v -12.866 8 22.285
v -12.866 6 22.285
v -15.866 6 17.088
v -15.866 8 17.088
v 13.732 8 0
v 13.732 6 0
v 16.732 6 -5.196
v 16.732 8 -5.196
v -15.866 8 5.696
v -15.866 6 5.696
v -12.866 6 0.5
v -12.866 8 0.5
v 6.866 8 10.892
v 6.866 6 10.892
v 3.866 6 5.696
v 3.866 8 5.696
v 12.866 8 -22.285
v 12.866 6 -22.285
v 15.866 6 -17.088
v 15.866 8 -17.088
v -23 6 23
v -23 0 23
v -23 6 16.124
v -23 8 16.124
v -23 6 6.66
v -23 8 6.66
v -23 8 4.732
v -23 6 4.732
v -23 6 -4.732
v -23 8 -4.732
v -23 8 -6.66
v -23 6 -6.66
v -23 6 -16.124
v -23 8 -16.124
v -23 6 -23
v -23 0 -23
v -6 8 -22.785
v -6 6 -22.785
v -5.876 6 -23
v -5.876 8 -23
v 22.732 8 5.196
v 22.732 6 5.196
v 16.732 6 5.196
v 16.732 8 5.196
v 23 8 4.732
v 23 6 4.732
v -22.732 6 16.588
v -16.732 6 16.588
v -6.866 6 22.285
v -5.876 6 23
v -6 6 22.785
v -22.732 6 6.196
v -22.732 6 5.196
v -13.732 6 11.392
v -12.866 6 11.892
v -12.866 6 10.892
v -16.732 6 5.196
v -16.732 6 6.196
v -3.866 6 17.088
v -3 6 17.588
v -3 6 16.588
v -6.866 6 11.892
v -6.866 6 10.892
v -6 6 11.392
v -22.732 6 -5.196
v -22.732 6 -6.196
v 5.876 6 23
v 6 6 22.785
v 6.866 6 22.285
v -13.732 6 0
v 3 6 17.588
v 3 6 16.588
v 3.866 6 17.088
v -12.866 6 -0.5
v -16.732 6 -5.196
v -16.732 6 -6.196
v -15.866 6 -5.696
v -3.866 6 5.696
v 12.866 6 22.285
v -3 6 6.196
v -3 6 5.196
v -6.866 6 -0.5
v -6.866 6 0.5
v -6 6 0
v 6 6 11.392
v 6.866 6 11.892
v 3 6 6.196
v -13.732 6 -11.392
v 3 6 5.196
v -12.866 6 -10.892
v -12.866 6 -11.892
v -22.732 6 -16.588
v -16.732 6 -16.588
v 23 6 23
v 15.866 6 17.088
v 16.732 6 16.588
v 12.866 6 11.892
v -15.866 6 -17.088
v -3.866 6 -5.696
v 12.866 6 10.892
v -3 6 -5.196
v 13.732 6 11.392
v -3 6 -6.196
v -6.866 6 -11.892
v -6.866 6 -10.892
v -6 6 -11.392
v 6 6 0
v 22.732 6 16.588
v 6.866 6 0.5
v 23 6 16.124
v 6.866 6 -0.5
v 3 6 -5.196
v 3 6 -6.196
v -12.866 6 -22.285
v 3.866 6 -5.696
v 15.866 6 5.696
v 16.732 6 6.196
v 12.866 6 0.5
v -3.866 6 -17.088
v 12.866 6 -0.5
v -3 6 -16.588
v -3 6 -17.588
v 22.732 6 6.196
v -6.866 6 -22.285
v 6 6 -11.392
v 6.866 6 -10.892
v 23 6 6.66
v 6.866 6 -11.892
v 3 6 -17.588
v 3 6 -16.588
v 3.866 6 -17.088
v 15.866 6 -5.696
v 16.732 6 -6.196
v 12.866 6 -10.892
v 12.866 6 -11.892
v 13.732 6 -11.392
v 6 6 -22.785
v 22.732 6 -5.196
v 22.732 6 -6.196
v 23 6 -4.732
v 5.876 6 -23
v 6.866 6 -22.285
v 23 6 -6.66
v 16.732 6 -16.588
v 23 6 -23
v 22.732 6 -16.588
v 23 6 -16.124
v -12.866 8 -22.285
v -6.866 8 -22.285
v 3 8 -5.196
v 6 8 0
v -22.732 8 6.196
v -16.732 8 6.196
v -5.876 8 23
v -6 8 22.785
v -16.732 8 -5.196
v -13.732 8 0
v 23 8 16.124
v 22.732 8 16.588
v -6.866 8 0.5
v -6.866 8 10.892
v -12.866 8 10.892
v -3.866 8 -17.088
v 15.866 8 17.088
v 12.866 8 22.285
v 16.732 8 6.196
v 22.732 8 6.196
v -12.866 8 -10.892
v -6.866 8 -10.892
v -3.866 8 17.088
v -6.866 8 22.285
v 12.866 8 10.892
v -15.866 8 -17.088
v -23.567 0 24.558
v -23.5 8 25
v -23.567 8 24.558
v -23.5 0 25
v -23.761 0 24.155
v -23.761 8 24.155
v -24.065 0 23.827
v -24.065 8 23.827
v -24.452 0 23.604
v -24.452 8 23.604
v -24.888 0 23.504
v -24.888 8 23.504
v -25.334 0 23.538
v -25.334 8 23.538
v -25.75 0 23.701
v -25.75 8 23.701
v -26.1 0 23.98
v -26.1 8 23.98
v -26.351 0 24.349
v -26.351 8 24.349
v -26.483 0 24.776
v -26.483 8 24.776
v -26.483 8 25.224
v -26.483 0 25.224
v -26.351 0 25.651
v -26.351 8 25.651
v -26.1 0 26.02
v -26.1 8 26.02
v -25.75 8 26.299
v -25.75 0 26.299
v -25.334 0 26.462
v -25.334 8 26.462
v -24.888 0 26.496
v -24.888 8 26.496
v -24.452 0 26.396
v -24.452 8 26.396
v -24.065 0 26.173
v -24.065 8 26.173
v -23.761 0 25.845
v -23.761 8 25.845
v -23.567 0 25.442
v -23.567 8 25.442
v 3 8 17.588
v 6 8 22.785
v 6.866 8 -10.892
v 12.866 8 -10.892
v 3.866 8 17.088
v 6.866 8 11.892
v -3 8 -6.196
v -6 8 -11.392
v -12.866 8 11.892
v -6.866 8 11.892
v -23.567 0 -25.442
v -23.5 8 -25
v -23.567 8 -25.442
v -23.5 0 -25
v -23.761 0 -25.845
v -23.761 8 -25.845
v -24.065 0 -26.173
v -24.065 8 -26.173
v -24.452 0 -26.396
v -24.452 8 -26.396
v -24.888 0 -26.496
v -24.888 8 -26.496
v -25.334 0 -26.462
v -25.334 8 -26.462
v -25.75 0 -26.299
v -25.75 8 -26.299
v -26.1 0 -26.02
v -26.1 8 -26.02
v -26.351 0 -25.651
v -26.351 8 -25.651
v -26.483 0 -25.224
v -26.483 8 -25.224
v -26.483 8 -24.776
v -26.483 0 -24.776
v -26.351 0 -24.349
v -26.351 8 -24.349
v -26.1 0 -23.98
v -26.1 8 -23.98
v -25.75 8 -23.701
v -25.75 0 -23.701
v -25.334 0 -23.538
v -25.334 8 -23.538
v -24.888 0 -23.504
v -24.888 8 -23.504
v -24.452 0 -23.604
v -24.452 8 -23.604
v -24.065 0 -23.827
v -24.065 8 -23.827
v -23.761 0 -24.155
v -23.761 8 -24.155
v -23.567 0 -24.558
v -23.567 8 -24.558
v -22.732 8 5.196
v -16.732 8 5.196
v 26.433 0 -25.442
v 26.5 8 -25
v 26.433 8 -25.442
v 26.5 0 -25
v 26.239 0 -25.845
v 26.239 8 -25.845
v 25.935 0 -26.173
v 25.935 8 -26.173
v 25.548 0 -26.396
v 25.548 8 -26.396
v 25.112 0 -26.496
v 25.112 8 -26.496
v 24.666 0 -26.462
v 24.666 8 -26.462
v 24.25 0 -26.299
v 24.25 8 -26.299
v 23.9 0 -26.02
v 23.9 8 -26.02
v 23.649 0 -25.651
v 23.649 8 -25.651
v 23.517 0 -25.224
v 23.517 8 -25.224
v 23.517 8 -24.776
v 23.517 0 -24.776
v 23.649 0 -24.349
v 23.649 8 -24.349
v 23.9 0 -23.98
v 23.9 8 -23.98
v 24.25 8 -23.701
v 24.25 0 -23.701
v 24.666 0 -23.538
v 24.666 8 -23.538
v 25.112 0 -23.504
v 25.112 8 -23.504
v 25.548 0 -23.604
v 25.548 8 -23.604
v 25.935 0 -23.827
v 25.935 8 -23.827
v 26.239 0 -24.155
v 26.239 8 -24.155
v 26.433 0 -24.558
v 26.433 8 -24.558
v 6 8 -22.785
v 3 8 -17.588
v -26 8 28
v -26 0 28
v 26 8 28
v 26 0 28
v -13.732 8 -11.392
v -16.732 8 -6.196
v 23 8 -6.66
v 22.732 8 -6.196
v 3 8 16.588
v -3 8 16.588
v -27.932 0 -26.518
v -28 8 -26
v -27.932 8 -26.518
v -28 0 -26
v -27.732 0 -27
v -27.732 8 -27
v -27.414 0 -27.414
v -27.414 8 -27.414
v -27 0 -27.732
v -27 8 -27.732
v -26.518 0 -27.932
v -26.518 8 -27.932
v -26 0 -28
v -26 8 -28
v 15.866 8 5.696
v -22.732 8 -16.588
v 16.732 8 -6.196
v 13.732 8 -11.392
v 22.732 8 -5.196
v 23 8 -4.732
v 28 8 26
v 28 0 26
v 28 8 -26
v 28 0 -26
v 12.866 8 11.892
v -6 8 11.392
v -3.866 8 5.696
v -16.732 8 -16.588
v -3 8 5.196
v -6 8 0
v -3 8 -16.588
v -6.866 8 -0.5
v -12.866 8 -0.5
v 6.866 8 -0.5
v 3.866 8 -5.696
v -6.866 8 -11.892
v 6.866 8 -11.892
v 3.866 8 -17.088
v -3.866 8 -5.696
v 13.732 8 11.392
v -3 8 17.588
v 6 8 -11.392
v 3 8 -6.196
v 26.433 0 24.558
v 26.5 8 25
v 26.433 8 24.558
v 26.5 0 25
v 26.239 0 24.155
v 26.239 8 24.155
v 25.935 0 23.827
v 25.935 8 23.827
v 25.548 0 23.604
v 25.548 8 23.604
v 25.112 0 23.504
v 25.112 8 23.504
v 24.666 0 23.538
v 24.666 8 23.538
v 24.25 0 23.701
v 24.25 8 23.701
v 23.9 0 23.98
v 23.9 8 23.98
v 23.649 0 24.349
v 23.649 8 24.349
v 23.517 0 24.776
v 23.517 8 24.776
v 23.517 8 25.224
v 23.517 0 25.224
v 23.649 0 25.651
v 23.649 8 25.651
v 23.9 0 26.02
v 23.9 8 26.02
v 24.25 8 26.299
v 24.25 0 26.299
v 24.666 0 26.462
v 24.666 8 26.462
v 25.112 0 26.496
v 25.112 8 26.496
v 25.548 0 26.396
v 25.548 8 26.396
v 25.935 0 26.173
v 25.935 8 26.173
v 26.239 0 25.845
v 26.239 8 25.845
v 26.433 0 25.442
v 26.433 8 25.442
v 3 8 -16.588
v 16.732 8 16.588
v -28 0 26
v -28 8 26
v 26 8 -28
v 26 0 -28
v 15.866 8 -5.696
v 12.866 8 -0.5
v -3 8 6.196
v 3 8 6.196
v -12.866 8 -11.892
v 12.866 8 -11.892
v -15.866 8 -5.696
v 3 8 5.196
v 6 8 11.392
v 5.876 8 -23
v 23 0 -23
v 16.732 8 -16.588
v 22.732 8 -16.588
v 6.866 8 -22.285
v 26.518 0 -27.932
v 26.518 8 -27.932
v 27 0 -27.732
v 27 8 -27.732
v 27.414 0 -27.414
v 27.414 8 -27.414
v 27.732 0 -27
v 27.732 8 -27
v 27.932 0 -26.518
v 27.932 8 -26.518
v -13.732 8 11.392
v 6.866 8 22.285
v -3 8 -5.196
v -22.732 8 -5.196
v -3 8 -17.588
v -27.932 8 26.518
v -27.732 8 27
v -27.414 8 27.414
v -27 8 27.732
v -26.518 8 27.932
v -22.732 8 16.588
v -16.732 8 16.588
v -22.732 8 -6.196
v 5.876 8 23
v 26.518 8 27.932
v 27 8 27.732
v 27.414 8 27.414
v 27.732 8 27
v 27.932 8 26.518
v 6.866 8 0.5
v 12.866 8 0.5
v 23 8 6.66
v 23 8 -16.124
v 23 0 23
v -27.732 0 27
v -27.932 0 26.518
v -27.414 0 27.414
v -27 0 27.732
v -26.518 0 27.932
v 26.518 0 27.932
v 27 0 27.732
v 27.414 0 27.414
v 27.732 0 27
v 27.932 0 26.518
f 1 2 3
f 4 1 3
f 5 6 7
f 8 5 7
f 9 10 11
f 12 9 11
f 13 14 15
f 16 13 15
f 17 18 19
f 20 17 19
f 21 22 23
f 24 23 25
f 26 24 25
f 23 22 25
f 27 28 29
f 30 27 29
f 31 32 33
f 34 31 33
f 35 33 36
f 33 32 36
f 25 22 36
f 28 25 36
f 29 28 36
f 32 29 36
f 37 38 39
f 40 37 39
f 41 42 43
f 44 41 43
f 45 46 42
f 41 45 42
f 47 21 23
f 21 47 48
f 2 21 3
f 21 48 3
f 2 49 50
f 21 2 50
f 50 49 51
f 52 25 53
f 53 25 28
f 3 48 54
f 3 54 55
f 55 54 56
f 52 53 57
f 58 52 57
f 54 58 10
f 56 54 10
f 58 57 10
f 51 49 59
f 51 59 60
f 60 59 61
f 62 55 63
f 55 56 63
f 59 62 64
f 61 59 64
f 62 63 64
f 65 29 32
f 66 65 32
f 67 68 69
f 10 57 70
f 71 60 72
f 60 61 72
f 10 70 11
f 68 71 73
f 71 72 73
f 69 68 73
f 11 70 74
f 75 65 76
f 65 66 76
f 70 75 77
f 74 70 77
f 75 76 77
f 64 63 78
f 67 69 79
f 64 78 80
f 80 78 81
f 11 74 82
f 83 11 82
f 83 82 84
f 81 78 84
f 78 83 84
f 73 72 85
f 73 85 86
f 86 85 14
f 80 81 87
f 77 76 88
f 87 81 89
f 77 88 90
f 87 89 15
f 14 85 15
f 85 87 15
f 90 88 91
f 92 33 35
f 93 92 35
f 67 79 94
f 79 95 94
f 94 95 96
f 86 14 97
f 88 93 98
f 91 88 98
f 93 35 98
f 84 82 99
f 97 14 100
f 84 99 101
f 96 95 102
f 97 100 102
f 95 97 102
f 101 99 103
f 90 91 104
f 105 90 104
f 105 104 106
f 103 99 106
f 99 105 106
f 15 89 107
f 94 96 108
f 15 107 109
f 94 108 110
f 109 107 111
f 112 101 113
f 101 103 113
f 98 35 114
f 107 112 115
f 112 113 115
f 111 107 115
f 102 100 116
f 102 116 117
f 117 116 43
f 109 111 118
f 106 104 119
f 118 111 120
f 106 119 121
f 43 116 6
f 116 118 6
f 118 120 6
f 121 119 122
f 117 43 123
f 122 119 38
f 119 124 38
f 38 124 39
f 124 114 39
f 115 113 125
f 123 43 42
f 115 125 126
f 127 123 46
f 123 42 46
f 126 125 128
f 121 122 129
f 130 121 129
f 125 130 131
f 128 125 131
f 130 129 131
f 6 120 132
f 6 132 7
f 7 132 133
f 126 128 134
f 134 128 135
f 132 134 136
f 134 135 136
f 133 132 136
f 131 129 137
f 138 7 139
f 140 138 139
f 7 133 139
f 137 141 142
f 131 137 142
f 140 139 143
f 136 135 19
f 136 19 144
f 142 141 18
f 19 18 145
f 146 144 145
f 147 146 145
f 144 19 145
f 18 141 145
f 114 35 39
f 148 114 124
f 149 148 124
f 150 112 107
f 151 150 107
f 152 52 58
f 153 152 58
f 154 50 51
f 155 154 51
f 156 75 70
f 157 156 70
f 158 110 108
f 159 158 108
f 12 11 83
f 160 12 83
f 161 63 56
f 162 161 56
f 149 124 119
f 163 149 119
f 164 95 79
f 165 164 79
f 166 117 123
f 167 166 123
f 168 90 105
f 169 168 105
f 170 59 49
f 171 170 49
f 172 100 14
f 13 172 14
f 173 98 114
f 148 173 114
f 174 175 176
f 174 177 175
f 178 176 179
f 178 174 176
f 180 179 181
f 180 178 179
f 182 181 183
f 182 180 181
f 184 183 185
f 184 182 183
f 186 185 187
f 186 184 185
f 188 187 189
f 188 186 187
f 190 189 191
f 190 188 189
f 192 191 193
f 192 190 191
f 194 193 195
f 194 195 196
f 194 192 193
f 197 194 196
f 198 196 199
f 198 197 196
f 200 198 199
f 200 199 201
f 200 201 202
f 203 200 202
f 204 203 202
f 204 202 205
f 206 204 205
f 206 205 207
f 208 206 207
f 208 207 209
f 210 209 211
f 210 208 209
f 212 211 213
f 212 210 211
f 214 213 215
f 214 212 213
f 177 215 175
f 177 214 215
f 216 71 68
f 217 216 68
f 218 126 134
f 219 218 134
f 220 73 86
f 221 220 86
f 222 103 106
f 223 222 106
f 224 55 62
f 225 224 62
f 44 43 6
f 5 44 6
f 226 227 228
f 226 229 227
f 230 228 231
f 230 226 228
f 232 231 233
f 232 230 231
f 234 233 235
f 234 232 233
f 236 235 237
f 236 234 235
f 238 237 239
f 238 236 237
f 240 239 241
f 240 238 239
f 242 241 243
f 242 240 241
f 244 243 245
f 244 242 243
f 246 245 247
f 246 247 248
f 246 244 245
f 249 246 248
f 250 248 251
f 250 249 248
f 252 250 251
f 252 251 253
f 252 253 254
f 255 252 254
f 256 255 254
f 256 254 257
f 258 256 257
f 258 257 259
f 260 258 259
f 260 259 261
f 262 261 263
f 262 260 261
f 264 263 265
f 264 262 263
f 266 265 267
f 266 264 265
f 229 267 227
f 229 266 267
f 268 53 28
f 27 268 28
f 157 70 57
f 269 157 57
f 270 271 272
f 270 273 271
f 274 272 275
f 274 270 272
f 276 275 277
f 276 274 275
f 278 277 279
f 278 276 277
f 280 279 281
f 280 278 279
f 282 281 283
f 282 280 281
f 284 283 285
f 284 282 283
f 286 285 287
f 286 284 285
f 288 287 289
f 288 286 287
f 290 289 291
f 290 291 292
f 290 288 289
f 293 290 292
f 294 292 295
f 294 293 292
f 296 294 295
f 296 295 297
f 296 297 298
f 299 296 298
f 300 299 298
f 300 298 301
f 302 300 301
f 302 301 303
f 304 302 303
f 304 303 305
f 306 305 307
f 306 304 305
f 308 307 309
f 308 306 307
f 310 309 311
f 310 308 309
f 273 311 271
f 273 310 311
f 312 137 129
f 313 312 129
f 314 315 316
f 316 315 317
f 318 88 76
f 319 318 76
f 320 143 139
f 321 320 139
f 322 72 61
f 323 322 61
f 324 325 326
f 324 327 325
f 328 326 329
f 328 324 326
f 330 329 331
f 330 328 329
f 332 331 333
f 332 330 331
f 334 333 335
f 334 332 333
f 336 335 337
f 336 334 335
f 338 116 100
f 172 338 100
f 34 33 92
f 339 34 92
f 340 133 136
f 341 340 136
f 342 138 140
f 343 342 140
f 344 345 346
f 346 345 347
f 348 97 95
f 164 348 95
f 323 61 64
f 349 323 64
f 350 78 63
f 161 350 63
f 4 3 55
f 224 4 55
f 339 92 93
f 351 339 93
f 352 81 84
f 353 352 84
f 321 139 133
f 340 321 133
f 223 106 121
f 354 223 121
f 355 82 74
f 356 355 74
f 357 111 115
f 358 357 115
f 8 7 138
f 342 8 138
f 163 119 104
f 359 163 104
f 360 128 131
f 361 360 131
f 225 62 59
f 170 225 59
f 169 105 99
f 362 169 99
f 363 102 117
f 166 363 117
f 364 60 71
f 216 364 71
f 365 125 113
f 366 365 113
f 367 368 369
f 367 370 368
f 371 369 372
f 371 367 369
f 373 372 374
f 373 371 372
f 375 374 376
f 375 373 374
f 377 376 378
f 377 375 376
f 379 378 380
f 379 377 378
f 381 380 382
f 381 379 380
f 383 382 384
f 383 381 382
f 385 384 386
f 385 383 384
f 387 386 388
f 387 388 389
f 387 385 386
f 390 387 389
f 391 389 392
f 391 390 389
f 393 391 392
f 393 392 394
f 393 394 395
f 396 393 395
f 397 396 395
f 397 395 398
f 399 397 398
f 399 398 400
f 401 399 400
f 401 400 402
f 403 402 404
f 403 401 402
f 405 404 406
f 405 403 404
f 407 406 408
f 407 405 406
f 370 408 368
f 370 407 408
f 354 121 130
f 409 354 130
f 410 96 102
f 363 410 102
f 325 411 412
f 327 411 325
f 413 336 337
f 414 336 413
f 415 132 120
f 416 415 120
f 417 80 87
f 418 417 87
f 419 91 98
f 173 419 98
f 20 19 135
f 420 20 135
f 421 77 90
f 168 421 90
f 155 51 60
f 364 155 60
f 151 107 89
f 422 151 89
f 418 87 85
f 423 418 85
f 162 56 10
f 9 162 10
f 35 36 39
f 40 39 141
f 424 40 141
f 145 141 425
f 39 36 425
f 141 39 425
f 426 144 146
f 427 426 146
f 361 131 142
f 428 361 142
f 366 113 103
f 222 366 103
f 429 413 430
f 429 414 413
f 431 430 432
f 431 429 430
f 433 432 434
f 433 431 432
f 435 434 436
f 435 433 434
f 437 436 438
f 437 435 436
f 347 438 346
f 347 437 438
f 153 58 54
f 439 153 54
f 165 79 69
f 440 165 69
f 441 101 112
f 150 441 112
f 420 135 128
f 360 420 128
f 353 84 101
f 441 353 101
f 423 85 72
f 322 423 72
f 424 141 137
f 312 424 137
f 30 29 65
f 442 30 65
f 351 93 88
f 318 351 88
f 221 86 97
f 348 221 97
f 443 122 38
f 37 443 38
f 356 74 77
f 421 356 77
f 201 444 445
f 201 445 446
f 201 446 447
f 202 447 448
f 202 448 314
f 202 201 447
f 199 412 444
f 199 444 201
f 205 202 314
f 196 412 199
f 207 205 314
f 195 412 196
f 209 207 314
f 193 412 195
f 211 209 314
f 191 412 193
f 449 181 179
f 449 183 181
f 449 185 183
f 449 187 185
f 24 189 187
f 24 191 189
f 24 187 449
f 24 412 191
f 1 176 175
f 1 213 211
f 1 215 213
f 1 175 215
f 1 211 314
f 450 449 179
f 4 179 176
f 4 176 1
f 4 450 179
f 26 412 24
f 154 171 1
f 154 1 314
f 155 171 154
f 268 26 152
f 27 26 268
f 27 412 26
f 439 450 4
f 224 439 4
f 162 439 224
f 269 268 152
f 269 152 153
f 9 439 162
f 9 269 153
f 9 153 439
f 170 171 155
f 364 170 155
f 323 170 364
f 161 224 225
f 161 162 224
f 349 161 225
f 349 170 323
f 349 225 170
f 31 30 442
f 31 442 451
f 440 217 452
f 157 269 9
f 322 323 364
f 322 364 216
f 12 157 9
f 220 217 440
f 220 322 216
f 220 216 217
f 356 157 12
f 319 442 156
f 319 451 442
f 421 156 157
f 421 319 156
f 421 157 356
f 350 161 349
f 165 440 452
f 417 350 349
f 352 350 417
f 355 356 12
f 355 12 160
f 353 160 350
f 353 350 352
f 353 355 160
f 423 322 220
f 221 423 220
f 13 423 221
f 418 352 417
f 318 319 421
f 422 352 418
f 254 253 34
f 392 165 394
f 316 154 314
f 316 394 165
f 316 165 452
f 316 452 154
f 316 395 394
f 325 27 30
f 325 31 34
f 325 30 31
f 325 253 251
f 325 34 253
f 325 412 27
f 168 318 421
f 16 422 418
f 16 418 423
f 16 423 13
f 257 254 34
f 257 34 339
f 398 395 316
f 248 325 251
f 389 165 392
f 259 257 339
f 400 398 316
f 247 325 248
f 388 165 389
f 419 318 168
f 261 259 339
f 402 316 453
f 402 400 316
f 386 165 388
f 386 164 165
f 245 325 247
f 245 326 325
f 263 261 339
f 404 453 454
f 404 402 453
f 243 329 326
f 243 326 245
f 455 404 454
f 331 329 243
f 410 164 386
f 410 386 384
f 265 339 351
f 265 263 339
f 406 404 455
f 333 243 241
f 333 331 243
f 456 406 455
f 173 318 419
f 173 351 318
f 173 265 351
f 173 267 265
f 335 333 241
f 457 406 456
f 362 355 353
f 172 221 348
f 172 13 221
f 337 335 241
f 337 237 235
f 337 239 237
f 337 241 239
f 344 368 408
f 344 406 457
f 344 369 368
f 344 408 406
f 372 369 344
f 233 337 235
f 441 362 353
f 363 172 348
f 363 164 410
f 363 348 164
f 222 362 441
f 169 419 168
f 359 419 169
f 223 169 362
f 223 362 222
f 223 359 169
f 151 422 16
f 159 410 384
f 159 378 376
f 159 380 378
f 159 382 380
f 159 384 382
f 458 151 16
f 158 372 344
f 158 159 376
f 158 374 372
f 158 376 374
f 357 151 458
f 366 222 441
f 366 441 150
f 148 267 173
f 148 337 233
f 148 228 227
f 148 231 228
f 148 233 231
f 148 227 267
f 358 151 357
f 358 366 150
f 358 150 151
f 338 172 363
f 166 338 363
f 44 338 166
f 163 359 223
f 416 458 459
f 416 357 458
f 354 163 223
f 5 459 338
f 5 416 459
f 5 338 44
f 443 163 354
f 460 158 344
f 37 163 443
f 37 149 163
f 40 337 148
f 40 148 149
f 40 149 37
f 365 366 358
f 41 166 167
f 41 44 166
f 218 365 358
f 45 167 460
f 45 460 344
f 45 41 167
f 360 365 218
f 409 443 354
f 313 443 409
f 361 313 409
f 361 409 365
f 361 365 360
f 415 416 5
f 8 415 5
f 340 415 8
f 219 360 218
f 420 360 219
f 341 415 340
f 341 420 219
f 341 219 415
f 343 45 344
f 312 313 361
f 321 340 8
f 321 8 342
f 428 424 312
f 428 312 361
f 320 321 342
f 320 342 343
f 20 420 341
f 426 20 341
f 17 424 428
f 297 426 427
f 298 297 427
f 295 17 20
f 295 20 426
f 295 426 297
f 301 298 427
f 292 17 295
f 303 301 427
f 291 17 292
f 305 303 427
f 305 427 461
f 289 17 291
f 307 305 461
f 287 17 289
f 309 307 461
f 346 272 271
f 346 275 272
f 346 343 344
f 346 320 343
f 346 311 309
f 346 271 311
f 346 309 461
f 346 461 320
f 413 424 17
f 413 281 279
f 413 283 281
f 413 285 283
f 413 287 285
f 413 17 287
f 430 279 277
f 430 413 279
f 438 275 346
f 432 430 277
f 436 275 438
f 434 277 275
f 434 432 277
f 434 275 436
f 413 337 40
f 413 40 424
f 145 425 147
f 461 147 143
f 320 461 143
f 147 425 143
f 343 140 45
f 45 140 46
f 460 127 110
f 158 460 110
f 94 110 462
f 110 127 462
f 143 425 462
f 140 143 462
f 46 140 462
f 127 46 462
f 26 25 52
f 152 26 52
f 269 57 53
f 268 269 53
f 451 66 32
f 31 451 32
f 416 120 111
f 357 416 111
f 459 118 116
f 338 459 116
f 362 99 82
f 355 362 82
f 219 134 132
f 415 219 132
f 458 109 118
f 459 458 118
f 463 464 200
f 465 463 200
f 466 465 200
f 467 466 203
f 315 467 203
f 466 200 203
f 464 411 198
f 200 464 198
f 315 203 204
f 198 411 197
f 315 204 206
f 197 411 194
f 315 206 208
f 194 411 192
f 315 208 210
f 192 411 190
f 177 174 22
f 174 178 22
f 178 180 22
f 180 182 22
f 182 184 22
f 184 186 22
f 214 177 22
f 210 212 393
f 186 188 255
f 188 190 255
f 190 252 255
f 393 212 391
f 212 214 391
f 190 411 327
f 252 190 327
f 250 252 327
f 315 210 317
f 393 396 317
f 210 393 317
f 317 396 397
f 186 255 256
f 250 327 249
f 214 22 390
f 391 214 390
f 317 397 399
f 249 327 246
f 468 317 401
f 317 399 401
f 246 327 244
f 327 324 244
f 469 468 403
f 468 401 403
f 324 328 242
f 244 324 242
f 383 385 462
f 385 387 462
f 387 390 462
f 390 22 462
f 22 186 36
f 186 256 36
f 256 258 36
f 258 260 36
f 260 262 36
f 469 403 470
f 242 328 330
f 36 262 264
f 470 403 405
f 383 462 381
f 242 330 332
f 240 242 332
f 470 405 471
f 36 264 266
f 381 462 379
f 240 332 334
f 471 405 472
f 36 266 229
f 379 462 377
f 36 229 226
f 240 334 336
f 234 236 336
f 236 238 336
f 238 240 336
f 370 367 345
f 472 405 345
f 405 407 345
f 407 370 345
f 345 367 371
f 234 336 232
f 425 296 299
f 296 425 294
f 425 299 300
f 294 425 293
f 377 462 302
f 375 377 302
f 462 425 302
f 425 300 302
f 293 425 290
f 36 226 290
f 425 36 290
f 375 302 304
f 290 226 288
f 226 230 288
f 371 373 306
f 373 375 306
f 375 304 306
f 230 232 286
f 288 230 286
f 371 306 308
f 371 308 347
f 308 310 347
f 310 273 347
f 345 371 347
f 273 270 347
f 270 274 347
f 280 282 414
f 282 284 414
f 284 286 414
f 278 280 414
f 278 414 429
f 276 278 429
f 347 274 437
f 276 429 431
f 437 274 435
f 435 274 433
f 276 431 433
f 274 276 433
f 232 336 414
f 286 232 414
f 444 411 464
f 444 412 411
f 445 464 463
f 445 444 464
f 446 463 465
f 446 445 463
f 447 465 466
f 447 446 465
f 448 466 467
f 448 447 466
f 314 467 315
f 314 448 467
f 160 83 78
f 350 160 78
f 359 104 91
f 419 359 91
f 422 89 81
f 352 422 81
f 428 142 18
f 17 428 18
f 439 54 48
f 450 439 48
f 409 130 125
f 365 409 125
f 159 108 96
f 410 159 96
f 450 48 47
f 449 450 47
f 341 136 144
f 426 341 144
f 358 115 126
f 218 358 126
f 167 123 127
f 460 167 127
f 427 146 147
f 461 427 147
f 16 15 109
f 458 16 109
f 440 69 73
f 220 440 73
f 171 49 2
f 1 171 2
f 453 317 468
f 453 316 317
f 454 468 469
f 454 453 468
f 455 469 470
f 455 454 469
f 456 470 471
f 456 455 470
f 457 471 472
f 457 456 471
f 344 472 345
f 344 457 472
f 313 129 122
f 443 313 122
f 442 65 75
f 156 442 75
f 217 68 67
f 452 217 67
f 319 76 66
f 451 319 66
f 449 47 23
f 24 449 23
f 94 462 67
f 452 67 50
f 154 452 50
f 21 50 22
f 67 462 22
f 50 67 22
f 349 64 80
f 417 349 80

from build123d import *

# Parameters (mm, degrees)
SKETCH1_W               = 56
SKETCH1_H               = 56
SKETCH1_R               = 1.5
SKETCH1_W_2             = 46
SKETCH1_H_2             = 46
BOSS_EXTRUDE1_DEPTH     = 6
BOSS_EXTRUDE2_START     = 6
SKETCH1_2_W             = 56
SKETCH1_2_H             = 56
SKETCH1_2_R             = 1.5
BOSS_EXTRUDE2_DEPTH     = 2
CUT_EXTRUDE1_DEPTH      = 7
CUT_EXTRUDE1_DEPTH_BACK = 3
FILLET1_R               = 2


with BuildPart() as part:
    # Sketch1 → Boss-Extrude1 (new body)
    with BuildSketch(Plane(origin=(0, 0, 0), x_dir=(1, 0, 0), z_dir=(0, 1, 0))):
        Rectangle(SKETCH1_W, SKETCH1_H)
        with Locations((-25, 25)):
            Circle(SKETCH1_R, mode=Mode.SUBTRACT)
        with Locations((25, 25)):
            Circle(SKETCH1_R, mode=Mode.SUBTRACT)
        with Locations((25, -25)):
            Circle(SKETCH1_R, mode=Mode.SUBTRACT)
        with Locations((-25, -25)):
            Circle(SKETCH1_R, mode=Mode.SUBTRACT)
        Rectangle(SKETCH1_W_2, SKETCH1_H_2, mode=Mode.SUBTRACT)
    extrude(amount=BOSS_EXTRUDE1_DEPTH)

    # Sketch1<2> → Boss-Extrude2 (add)
    with BuildSketch(Plane(origin=(0, 0, 0), x_dir=(1, 0, 0), z_dir=(0, 1, 0)).offset(BOSS_EXTRUDE2_START)):
        Rectangle(SKETCH1_2_W, SKETCH1_2_H)
        with Locations((-25, 25)):
            Circle(SKETCH1_2_R, mode=Mode.SUBTRACT)
        with Locations((25, 25)):
            Circle(SKETCH1_2_R, mode=Mode.SUBTRACT)
        with Locations((25, -25)):
            Circle(SKETCH1_2_R, mode=Mode.SUBTRACT)
        with Locations((-25, -25)):
            Circle(SKETCH1_2_R, mode=Mode.SUBTRACT)
    extrude(amount=BOSS_EXTRUDE2_DEPTH)

    # Sketch2 → Cut-Extrude1 (cut, two sides)
    with BuildSketch(Plane.XZ.offset(-6)) as cut_extrude1_sk:
        Polygon((-22.732050808, 5.196152423), (-23, 4.732050808), (-23, -4.732050808), (-22.732050808, -5.196152423), (-16.732050808, -5.196152423), (-13.732050808, 0), (-16.732050808, 5.196152423), align=None)
        Polygon((-22.732050808, 16.588457268), (-23, 16.124355653), (-23, 6.660254038), (-22.732050808, 6.196152423), (-16.732050808, 6.196152423), (-13.732050808, 11.392304845), (-16.732050808, 16.588457268), align=None)
        Polygon((-3.866025404, 5.696152423), (-6.866025404, 10.892304845), (-12.866025404, 10.892304845), (-15.866025404, 5.696152423), (-12.866025404, 0.5), (-6.866025404, 0.5), align=None)
        Polygon((-12.866025404, 11.892304845), (-6.866025404, 11.892304845), (-3.866025404, 17.088457268), (-6.866025404, 22.284609691), (-12.866025404, 22.284609691), (-15.866025404, 17.088457268), align=None)
        Polygon((-6, 11.392304845), (-3, 6.196152423), (3, 6.196152423), (6, 11.392304845), (3, 16.588457268), (-3, 16.588457268), align=None)
        Polygon((6, 22.784609691), (5.875644347, 23), (-5.875644347, 23), (-6, 22.784609691), (-3, 17.588457268), (3, 17.588457268), align=None)
        Polygon((3.866025404, 17.088457268), (6.866025404, 11.892304845), (12.866025404, 11.892304845), (15.866025404, 17.088457268), (12.866025404, 22.284609691), (6.866025404, 22.284609691), align=None)
        Polygon((16.732050808, 6.196152423), (22.732050808, 6.196152423), (23, 6.660254038), (23, 16.124355653), (22.732050808, 16.588457268), (16.732050808, 16.588457268), (13.732050808, 11.392304845), align=None)
        Polygon((6.866025404, 0.5), (12.866025404, 0.5), (15.866025404, 5.696152423), (12.866025404, 10.892304845), (6.866025404, 10.892304845), (3.866025404, 5.696152423), align=None)
        Polygon((23, -4.732050808), (23, 4.732050808), (22.732050808, 5.196152423), (16.732050808, 5.196152423), (13.732050808, 0), (16.732050808, -5.196152423), (22.732050808, -5.196152423), align=None)
        Polygon((3.866025404, -5.696152423), (6.866025404, -10.892304845), (12.866025404, -10.892304845), (15.866025404, -5.696152423), (12.866025404, -0.5), (6.866025404, -0.5), align=None)
        Polygon((23, -16.124355653), (23, -6.660254038), (22.732050808, -6.196152423), (16.732050808, -6.196152423), (13.732050808, -11.392304845), (16.732050808, -16.588457268), (22.732050808, -16.588457268), align=None)
        Polygon((-6, 0), (-3, -5.196152423), (3, -5.196152423), (6, 0), (3, 5.196152423), (-3, 5.196152423), align=None)
        Polygon((-3, -6.196152423), (-6, -11.392304845), (-3, -16.588457268), (3, -16.588457268), (6, -11.392304845), (3, -6.196152423), align=None)
        Polygon((12.866025404, -11.892304845), (6.866025404, -11.892304845), (3.866025404, -17.088457268), (6.866025404, -22.284609691), (12.866025404, -22.284609691), (15.866025404, -17.088457268), align=None)
        Polygon((-5.875644347, -23), (5.875644347, -23), (6, -22.784609691), (3, -17.588457268), (-3, -17.588457268), (-6, -22.784609691), align=None)
        Polygon((-6.866025404, -0.5), (-12.866025404, -0.5), (-15.866025404, -5.696152423), (-12.866025404, -10.892304845), (-6.866025404, -10.892304845), (-3.866025404, -5.696152423), align=None)
        Polygon((-3.866025404, -17.088457268), (-6.866025404, -11.892304845), (-12.866025404, -11.892304845), (-15.866025404, -17.088457268), (-12.866025404, -22.284609691), (-6.866025404, -22.284609691), align=None)
        Polygon((-23, -6.660254038), (-23, -16.124355653), (-22.732050808, -16.588457268), (-16.732050808, -16.588457268), (-13.732050808, -11.392304845), (-16.732050808, -6.196152423), (-22.732050808, -6.196152423), align=None)
    extrude(amount=CUT_EXTRUDE1_DEPTH, mode=Mode.SUBTRACT)
    extrude(cut_extrude1_sk.sketch, amount=-CUT_EXTRUDE1_DEPTH_BACK, mode=Mode.SUBTRACT)

    # Fillet1
    fillet1_edges = [part.edges().sort_by_distance(p)[0] for p in [
        (28, 4, -28),
        (28, 4, 28),
        (-28, 4, 28),
        (-28, 4, -28),
    ]]
    fillet(fillet1_edges, radius=FILLET1_R)


solid = part.part
